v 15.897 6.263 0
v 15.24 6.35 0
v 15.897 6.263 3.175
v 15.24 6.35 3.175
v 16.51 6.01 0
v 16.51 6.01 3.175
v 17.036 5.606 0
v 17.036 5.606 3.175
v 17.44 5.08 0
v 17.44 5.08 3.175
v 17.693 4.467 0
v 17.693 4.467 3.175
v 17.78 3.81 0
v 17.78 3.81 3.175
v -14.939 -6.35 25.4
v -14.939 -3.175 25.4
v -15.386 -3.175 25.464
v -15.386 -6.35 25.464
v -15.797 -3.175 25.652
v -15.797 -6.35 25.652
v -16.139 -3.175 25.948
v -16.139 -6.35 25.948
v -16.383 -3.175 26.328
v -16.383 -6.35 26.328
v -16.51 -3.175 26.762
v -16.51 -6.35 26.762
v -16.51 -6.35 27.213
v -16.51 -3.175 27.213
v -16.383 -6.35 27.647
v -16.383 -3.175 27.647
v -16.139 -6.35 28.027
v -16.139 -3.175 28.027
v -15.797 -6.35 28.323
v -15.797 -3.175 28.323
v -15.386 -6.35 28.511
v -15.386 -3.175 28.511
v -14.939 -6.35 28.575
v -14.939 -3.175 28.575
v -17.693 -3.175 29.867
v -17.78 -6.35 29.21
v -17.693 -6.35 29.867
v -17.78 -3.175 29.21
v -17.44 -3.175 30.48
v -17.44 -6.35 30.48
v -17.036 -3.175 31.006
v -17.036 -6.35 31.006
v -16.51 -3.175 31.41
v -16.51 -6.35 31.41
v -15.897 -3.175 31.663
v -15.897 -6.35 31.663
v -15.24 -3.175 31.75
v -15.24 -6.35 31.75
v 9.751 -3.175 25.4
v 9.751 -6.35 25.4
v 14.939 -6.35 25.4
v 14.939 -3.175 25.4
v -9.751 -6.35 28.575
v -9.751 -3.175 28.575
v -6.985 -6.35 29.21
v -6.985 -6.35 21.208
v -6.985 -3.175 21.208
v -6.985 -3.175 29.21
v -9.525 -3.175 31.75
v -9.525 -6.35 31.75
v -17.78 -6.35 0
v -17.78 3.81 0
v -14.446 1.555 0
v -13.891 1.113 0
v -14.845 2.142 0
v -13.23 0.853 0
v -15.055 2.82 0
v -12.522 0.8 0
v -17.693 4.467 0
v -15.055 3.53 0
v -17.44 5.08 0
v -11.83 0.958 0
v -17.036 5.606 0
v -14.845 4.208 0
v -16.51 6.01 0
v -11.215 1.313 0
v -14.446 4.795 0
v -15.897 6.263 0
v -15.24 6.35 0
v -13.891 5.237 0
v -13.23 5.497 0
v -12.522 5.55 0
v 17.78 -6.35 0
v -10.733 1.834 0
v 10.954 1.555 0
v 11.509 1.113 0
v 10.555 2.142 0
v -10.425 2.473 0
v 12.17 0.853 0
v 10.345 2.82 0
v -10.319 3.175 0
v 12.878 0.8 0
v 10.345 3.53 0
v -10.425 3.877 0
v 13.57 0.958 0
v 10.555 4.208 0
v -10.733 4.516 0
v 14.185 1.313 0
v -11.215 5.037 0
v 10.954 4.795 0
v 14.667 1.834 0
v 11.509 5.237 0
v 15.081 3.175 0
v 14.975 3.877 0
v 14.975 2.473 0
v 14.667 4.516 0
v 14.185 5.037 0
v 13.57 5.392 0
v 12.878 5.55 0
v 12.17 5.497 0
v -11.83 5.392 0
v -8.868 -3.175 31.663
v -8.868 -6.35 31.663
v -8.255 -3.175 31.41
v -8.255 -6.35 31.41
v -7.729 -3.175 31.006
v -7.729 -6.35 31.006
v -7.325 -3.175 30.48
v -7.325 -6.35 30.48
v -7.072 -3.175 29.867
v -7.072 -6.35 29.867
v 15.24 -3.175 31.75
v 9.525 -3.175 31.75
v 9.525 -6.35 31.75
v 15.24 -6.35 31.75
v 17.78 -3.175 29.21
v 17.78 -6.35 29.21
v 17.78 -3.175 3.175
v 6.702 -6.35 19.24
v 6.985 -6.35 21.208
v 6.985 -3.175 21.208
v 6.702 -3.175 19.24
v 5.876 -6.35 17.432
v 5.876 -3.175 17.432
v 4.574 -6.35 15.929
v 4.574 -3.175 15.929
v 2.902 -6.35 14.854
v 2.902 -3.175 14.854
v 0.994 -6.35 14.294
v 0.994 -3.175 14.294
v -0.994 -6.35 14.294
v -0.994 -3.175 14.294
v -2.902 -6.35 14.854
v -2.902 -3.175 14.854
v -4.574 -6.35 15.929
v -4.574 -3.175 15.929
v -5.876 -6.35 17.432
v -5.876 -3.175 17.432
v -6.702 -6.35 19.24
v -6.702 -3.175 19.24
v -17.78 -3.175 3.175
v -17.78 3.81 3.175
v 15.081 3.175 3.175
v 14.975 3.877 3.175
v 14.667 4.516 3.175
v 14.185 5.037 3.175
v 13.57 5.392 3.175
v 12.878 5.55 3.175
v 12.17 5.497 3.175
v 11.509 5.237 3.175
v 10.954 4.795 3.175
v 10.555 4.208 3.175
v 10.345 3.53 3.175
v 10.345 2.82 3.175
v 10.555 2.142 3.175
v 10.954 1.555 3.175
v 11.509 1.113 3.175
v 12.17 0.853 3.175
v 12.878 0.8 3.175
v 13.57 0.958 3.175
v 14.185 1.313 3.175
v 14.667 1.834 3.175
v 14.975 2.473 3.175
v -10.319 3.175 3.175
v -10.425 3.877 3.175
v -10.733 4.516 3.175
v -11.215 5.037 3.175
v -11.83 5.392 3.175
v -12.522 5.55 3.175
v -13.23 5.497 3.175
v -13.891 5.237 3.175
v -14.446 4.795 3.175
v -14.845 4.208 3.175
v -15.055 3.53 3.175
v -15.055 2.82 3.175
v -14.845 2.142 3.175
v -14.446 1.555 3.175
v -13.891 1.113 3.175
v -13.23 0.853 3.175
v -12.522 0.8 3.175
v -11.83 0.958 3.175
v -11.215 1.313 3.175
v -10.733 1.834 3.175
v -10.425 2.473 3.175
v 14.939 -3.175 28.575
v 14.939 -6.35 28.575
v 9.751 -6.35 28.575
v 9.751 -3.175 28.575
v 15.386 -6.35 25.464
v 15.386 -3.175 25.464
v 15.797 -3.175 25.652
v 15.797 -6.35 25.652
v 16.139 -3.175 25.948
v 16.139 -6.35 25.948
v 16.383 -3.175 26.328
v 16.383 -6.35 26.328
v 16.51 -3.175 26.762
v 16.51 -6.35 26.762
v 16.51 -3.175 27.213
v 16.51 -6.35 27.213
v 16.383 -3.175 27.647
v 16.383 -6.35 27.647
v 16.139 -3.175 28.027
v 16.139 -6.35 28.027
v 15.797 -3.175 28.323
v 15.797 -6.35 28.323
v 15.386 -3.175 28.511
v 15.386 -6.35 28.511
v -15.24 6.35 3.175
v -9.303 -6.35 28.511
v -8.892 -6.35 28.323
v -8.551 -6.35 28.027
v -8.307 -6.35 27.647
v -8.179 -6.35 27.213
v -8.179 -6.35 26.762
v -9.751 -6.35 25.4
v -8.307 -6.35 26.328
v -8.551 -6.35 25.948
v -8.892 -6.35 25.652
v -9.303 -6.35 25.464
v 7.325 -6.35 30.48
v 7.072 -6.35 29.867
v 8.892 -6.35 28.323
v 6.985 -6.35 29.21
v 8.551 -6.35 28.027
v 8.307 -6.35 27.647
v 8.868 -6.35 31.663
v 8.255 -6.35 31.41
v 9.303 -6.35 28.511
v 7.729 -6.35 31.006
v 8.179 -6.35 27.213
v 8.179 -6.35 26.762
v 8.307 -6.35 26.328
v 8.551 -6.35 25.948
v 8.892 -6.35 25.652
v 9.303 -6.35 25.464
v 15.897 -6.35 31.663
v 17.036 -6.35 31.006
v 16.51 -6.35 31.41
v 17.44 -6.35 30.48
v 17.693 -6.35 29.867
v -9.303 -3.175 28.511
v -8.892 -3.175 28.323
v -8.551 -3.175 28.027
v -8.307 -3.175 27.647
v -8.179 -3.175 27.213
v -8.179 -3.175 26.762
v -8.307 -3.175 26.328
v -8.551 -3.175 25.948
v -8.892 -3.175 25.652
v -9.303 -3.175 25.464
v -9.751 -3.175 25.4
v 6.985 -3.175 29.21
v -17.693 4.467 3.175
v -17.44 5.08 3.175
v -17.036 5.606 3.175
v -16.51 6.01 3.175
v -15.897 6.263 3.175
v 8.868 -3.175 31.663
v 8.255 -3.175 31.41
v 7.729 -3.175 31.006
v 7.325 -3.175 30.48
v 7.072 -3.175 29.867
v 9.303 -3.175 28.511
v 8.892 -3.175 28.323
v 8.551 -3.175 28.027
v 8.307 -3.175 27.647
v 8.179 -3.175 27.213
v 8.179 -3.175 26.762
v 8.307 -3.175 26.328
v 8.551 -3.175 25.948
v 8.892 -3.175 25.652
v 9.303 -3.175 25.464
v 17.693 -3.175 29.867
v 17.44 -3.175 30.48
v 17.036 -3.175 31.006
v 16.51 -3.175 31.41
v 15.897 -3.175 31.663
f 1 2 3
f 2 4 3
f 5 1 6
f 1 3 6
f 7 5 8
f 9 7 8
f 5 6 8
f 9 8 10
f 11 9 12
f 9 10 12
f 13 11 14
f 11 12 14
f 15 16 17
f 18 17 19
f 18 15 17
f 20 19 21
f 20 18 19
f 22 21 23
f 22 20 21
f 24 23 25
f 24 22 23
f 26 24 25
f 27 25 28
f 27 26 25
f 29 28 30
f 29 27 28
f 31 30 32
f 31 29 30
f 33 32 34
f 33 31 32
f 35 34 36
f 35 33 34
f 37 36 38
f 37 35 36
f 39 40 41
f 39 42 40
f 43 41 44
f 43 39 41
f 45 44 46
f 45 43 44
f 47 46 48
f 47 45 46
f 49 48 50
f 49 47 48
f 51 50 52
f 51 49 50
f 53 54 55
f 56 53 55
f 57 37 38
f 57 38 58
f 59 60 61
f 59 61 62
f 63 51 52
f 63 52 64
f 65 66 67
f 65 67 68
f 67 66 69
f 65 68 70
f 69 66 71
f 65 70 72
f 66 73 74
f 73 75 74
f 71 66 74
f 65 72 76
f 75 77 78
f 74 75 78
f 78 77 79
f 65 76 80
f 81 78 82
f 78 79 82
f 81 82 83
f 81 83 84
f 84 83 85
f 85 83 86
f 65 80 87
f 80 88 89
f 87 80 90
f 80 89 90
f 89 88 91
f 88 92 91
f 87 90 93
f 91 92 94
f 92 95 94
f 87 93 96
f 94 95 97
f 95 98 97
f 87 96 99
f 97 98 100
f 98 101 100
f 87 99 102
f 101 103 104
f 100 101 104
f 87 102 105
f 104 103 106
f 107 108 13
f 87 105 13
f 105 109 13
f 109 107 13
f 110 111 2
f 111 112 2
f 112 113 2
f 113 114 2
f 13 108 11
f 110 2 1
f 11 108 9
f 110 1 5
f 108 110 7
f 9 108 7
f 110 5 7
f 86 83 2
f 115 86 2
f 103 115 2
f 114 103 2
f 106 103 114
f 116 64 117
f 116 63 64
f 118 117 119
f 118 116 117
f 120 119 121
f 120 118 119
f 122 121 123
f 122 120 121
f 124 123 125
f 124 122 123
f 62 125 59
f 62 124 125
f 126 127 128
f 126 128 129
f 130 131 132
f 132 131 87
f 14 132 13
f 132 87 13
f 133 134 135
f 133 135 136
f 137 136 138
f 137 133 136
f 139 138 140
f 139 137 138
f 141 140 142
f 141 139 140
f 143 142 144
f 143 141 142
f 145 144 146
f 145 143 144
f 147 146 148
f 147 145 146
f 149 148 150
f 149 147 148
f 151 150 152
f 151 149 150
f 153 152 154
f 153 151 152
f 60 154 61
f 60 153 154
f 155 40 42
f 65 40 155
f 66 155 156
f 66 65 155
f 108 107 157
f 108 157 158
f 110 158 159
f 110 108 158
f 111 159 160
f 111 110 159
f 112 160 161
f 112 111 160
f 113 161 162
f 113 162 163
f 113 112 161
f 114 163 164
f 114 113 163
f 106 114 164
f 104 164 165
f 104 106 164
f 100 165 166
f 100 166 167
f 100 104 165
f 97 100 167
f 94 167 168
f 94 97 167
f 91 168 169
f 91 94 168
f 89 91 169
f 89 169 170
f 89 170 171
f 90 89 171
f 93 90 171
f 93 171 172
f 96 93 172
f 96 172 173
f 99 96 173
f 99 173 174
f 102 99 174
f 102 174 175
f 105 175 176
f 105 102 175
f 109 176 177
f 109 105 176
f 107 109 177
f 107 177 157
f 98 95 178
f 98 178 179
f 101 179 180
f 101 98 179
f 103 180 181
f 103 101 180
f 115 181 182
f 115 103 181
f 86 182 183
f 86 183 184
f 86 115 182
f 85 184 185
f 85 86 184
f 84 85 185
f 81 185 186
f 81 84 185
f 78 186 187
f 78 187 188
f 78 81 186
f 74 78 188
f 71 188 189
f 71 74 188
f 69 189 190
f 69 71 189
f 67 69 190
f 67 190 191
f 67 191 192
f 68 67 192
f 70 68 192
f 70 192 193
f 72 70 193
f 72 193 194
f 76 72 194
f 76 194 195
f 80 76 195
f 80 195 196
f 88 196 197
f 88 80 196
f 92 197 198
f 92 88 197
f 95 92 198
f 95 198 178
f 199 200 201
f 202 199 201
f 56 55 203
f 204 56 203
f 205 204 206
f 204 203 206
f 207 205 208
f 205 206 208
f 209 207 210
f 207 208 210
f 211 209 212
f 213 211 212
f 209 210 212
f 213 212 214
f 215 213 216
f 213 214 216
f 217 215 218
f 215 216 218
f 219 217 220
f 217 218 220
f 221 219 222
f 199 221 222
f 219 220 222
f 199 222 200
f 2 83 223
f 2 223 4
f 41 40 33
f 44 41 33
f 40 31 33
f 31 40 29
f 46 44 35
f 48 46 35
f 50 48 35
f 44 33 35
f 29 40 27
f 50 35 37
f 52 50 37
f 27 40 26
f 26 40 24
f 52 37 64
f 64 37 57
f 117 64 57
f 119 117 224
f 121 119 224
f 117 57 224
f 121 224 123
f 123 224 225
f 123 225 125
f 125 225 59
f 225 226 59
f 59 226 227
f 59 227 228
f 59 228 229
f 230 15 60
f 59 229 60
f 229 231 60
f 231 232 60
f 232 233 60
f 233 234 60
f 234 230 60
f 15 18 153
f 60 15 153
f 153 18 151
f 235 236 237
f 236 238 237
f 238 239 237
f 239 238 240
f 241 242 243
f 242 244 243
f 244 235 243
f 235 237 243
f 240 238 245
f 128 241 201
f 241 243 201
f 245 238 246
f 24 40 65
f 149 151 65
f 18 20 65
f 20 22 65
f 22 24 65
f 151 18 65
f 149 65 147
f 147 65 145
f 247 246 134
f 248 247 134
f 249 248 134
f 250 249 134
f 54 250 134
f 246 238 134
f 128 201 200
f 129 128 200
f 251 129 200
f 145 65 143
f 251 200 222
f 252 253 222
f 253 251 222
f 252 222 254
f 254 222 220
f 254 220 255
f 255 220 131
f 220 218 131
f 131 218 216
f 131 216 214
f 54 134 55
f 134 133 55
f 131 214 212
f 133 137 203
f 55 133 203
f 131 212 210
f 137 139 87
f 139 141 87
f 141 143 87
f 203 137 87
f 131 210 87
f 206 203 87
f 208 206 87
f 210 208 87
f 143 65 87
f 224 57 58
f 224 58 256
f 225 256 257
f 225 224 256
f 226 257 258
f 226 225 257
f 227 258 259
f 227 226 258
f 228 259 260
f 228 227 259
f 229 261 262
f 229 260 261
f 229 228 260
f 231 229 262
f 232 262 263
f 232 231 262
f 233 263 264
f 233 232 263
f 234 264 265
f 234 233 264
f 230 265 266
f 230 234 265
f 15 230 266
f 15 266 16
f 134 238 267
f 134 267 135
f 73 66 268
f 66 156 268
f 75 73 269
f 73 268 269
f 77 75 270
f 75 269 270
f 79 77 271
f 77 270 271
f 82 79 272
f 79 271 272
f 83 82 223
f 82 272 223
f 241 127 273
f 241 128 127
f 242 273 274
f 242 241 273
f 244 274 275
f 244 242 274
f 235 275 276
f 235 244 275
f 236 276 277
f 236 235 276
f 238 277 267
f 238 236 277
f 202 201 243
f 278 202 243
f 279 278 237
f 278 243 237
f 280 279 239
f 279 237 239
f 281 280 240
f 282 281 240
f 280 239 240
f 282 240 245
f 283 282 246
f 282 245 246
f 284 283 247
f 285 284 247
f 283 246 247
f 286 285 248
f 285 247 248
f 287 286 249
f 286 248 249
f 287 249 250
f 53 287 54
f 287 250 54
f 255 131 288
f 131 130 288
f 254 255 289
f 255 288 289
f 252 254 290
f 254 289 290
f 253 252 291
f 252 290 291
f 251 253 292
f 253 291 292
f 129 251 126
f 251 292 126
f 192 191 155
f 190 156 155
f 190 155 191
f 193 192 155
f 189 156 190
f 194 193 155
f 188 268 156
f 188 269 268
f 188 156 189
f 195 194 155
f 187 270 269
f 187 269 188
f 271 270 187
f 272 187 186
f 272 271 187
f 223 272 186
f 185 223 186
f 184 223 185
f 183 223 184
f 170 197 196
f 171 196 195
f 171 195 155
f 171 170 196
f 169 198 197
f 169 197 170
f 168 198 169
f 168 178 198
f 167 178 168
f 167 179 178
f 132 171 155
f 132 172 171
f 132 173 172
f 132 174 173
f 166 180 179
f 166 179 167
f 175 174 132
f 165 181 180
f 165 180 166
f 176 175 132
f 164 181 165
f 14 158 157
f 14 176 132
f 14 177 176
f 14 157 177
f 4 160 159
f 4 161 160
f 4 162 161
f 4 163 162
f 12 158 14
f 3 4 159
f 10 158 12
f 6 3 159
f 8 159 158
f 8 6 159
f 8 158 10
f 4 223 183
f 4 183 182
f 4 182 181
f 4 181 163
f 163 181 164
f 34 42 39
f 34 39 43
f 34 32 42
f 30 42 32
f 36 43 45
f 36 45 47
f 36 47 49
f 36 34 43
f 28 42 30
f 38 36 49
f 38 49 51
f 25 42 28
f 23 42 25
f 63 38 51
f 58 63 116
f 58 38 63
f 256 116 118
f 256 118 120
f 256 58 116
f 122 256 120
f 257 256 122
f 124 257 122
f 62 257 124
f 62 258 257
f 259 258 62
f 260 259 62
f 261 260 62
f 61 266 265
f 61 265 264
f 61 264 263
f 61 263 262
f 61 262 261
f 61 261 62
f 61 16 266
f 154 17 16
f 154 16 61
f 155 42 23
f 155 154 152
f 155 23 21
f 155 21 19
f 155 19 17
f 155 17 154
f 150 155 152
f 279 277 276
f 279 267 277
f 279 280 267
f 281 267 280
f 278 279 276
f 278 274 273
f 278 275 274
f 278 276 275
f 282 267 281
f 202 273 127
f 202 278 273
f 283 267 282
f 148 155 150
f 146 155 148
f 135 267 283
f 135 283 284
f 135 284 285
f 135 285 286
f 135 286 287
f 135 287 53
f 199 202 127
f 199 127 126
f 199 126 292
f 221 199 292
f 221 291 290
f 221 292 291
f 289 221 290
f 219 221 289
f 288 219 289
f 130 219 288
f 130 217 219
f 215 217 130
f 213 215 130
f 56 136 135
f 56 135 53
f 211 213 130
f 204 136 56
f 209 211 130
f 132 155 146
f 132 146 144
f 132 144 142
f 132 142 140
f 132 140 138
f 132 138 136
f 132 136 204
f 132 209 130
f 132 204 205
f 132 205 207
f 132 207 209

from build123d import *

# Parameters (mm, degrees)
SKETCH1_W           = 35.56
SKETCH1_H           = 12.7
SKETCH1_R           = 2.38125
BOSS_EXTRUDE1_DEPTH = 3.175
SKETCH7_W           = 35.56
SKETCH7_H           = 3.175
BOSS_EXTRUDE3_DEPTH = 28.575
CUT_EXTRUDE6_DEPTH  = 28.575
FILLET3_R           = 2.54


with BuildPart() as part:
    # Sketch1 → Boss-Extrude1 (new body)
    with BuildSketch(Plane.XY):
        Rectangle(SKETCH1_W, SKETCH1_H)
        with Locations((-12.7, 3.175)):
            Circle(SKETCH1_R, mode=Mode.SUBTRACT)
        with Locations((12.7, 3.175)):
            Circle(SKETCH1_R, mode=Mode.SUBTRACT)
    extrude(amount=BOSS_EXTRUDE1_DEPTH)

    # Sketch7 → Boss-Extrude3 (add)
    with BuildSketch(Plane.XY.offset(3.175)):
        with Locations((0, -4.7625)):
            Rectangle(SKETCH7_W, SKETCH7_H)
    extrude(amount=BOSS_EXTRUDE3_DEPTH)

    # Sketch11 → Cut-Extrude6 (cut)
    with BuildSketch(Plane.XZ.offset(6.35)):
        with BuildLine():
            Line((-6.985, 42.291890454), (6.985, 42.291890454))
            Line((6.985, 42.291890454), (6.985, 21.208109546))
            ThreePointArc((6.985, 21.208109546), (0, 14.223109546), (-6.985, 21.208109546))
            Line((-6.985, 21.208109546), (-6.985, 42.291890454))
        make_face()
        with BuildLine():
            Line((-14.938781825, 28.575), (-9.750668862, 28.575))
            ThreePointArc((-9.750668862, 28.575), (-8.163168862, 26.9875), (-9.750668862, 25.4))
            Line((-9.750668862, 25.4), (-14.938781825, 25.4))
            ThreePointArc((-14.938781825, 25.4), (-16.526281825, 26.9875), (-14.938781825, 28.575))
        make_face()
        with BuildLine():
            Line((14.938781825, 28.575), (9.750668862, 28.575))
            ThreePointArc((9.750668862, 28.575), (8.163168862, 26.9875), (9.750668862, 25.4))
            Line((9.750668862, 25.4), (14.938781825, 25.4))
            ThreePointArc((14.938781825, 25.4), (16.526281825, 26.9875), (14.938781825, 28.575))
        make_face()
    extrude(amount=-CUT_EXTRUDE6_DEPTH, mode=Mode.SUBTRACT)

    # Fillet3
    fillet3_edges = [part.edges().sort_by_distance(p)[0] for p in [
        (6.985, -4.7625, 31.75),
        (17.78, -4.7625, 31.75),
        (-6.985, -4.7625, 31.75),
        (-17.78, -4.7625, 31.75),
        (-17.78, 6.35, 1.5875),
        (17.78, 6.35, 1.5875),
    ]]
    fillet(fillet3_edges, radius=FILLET3_R)


solid = part.part
